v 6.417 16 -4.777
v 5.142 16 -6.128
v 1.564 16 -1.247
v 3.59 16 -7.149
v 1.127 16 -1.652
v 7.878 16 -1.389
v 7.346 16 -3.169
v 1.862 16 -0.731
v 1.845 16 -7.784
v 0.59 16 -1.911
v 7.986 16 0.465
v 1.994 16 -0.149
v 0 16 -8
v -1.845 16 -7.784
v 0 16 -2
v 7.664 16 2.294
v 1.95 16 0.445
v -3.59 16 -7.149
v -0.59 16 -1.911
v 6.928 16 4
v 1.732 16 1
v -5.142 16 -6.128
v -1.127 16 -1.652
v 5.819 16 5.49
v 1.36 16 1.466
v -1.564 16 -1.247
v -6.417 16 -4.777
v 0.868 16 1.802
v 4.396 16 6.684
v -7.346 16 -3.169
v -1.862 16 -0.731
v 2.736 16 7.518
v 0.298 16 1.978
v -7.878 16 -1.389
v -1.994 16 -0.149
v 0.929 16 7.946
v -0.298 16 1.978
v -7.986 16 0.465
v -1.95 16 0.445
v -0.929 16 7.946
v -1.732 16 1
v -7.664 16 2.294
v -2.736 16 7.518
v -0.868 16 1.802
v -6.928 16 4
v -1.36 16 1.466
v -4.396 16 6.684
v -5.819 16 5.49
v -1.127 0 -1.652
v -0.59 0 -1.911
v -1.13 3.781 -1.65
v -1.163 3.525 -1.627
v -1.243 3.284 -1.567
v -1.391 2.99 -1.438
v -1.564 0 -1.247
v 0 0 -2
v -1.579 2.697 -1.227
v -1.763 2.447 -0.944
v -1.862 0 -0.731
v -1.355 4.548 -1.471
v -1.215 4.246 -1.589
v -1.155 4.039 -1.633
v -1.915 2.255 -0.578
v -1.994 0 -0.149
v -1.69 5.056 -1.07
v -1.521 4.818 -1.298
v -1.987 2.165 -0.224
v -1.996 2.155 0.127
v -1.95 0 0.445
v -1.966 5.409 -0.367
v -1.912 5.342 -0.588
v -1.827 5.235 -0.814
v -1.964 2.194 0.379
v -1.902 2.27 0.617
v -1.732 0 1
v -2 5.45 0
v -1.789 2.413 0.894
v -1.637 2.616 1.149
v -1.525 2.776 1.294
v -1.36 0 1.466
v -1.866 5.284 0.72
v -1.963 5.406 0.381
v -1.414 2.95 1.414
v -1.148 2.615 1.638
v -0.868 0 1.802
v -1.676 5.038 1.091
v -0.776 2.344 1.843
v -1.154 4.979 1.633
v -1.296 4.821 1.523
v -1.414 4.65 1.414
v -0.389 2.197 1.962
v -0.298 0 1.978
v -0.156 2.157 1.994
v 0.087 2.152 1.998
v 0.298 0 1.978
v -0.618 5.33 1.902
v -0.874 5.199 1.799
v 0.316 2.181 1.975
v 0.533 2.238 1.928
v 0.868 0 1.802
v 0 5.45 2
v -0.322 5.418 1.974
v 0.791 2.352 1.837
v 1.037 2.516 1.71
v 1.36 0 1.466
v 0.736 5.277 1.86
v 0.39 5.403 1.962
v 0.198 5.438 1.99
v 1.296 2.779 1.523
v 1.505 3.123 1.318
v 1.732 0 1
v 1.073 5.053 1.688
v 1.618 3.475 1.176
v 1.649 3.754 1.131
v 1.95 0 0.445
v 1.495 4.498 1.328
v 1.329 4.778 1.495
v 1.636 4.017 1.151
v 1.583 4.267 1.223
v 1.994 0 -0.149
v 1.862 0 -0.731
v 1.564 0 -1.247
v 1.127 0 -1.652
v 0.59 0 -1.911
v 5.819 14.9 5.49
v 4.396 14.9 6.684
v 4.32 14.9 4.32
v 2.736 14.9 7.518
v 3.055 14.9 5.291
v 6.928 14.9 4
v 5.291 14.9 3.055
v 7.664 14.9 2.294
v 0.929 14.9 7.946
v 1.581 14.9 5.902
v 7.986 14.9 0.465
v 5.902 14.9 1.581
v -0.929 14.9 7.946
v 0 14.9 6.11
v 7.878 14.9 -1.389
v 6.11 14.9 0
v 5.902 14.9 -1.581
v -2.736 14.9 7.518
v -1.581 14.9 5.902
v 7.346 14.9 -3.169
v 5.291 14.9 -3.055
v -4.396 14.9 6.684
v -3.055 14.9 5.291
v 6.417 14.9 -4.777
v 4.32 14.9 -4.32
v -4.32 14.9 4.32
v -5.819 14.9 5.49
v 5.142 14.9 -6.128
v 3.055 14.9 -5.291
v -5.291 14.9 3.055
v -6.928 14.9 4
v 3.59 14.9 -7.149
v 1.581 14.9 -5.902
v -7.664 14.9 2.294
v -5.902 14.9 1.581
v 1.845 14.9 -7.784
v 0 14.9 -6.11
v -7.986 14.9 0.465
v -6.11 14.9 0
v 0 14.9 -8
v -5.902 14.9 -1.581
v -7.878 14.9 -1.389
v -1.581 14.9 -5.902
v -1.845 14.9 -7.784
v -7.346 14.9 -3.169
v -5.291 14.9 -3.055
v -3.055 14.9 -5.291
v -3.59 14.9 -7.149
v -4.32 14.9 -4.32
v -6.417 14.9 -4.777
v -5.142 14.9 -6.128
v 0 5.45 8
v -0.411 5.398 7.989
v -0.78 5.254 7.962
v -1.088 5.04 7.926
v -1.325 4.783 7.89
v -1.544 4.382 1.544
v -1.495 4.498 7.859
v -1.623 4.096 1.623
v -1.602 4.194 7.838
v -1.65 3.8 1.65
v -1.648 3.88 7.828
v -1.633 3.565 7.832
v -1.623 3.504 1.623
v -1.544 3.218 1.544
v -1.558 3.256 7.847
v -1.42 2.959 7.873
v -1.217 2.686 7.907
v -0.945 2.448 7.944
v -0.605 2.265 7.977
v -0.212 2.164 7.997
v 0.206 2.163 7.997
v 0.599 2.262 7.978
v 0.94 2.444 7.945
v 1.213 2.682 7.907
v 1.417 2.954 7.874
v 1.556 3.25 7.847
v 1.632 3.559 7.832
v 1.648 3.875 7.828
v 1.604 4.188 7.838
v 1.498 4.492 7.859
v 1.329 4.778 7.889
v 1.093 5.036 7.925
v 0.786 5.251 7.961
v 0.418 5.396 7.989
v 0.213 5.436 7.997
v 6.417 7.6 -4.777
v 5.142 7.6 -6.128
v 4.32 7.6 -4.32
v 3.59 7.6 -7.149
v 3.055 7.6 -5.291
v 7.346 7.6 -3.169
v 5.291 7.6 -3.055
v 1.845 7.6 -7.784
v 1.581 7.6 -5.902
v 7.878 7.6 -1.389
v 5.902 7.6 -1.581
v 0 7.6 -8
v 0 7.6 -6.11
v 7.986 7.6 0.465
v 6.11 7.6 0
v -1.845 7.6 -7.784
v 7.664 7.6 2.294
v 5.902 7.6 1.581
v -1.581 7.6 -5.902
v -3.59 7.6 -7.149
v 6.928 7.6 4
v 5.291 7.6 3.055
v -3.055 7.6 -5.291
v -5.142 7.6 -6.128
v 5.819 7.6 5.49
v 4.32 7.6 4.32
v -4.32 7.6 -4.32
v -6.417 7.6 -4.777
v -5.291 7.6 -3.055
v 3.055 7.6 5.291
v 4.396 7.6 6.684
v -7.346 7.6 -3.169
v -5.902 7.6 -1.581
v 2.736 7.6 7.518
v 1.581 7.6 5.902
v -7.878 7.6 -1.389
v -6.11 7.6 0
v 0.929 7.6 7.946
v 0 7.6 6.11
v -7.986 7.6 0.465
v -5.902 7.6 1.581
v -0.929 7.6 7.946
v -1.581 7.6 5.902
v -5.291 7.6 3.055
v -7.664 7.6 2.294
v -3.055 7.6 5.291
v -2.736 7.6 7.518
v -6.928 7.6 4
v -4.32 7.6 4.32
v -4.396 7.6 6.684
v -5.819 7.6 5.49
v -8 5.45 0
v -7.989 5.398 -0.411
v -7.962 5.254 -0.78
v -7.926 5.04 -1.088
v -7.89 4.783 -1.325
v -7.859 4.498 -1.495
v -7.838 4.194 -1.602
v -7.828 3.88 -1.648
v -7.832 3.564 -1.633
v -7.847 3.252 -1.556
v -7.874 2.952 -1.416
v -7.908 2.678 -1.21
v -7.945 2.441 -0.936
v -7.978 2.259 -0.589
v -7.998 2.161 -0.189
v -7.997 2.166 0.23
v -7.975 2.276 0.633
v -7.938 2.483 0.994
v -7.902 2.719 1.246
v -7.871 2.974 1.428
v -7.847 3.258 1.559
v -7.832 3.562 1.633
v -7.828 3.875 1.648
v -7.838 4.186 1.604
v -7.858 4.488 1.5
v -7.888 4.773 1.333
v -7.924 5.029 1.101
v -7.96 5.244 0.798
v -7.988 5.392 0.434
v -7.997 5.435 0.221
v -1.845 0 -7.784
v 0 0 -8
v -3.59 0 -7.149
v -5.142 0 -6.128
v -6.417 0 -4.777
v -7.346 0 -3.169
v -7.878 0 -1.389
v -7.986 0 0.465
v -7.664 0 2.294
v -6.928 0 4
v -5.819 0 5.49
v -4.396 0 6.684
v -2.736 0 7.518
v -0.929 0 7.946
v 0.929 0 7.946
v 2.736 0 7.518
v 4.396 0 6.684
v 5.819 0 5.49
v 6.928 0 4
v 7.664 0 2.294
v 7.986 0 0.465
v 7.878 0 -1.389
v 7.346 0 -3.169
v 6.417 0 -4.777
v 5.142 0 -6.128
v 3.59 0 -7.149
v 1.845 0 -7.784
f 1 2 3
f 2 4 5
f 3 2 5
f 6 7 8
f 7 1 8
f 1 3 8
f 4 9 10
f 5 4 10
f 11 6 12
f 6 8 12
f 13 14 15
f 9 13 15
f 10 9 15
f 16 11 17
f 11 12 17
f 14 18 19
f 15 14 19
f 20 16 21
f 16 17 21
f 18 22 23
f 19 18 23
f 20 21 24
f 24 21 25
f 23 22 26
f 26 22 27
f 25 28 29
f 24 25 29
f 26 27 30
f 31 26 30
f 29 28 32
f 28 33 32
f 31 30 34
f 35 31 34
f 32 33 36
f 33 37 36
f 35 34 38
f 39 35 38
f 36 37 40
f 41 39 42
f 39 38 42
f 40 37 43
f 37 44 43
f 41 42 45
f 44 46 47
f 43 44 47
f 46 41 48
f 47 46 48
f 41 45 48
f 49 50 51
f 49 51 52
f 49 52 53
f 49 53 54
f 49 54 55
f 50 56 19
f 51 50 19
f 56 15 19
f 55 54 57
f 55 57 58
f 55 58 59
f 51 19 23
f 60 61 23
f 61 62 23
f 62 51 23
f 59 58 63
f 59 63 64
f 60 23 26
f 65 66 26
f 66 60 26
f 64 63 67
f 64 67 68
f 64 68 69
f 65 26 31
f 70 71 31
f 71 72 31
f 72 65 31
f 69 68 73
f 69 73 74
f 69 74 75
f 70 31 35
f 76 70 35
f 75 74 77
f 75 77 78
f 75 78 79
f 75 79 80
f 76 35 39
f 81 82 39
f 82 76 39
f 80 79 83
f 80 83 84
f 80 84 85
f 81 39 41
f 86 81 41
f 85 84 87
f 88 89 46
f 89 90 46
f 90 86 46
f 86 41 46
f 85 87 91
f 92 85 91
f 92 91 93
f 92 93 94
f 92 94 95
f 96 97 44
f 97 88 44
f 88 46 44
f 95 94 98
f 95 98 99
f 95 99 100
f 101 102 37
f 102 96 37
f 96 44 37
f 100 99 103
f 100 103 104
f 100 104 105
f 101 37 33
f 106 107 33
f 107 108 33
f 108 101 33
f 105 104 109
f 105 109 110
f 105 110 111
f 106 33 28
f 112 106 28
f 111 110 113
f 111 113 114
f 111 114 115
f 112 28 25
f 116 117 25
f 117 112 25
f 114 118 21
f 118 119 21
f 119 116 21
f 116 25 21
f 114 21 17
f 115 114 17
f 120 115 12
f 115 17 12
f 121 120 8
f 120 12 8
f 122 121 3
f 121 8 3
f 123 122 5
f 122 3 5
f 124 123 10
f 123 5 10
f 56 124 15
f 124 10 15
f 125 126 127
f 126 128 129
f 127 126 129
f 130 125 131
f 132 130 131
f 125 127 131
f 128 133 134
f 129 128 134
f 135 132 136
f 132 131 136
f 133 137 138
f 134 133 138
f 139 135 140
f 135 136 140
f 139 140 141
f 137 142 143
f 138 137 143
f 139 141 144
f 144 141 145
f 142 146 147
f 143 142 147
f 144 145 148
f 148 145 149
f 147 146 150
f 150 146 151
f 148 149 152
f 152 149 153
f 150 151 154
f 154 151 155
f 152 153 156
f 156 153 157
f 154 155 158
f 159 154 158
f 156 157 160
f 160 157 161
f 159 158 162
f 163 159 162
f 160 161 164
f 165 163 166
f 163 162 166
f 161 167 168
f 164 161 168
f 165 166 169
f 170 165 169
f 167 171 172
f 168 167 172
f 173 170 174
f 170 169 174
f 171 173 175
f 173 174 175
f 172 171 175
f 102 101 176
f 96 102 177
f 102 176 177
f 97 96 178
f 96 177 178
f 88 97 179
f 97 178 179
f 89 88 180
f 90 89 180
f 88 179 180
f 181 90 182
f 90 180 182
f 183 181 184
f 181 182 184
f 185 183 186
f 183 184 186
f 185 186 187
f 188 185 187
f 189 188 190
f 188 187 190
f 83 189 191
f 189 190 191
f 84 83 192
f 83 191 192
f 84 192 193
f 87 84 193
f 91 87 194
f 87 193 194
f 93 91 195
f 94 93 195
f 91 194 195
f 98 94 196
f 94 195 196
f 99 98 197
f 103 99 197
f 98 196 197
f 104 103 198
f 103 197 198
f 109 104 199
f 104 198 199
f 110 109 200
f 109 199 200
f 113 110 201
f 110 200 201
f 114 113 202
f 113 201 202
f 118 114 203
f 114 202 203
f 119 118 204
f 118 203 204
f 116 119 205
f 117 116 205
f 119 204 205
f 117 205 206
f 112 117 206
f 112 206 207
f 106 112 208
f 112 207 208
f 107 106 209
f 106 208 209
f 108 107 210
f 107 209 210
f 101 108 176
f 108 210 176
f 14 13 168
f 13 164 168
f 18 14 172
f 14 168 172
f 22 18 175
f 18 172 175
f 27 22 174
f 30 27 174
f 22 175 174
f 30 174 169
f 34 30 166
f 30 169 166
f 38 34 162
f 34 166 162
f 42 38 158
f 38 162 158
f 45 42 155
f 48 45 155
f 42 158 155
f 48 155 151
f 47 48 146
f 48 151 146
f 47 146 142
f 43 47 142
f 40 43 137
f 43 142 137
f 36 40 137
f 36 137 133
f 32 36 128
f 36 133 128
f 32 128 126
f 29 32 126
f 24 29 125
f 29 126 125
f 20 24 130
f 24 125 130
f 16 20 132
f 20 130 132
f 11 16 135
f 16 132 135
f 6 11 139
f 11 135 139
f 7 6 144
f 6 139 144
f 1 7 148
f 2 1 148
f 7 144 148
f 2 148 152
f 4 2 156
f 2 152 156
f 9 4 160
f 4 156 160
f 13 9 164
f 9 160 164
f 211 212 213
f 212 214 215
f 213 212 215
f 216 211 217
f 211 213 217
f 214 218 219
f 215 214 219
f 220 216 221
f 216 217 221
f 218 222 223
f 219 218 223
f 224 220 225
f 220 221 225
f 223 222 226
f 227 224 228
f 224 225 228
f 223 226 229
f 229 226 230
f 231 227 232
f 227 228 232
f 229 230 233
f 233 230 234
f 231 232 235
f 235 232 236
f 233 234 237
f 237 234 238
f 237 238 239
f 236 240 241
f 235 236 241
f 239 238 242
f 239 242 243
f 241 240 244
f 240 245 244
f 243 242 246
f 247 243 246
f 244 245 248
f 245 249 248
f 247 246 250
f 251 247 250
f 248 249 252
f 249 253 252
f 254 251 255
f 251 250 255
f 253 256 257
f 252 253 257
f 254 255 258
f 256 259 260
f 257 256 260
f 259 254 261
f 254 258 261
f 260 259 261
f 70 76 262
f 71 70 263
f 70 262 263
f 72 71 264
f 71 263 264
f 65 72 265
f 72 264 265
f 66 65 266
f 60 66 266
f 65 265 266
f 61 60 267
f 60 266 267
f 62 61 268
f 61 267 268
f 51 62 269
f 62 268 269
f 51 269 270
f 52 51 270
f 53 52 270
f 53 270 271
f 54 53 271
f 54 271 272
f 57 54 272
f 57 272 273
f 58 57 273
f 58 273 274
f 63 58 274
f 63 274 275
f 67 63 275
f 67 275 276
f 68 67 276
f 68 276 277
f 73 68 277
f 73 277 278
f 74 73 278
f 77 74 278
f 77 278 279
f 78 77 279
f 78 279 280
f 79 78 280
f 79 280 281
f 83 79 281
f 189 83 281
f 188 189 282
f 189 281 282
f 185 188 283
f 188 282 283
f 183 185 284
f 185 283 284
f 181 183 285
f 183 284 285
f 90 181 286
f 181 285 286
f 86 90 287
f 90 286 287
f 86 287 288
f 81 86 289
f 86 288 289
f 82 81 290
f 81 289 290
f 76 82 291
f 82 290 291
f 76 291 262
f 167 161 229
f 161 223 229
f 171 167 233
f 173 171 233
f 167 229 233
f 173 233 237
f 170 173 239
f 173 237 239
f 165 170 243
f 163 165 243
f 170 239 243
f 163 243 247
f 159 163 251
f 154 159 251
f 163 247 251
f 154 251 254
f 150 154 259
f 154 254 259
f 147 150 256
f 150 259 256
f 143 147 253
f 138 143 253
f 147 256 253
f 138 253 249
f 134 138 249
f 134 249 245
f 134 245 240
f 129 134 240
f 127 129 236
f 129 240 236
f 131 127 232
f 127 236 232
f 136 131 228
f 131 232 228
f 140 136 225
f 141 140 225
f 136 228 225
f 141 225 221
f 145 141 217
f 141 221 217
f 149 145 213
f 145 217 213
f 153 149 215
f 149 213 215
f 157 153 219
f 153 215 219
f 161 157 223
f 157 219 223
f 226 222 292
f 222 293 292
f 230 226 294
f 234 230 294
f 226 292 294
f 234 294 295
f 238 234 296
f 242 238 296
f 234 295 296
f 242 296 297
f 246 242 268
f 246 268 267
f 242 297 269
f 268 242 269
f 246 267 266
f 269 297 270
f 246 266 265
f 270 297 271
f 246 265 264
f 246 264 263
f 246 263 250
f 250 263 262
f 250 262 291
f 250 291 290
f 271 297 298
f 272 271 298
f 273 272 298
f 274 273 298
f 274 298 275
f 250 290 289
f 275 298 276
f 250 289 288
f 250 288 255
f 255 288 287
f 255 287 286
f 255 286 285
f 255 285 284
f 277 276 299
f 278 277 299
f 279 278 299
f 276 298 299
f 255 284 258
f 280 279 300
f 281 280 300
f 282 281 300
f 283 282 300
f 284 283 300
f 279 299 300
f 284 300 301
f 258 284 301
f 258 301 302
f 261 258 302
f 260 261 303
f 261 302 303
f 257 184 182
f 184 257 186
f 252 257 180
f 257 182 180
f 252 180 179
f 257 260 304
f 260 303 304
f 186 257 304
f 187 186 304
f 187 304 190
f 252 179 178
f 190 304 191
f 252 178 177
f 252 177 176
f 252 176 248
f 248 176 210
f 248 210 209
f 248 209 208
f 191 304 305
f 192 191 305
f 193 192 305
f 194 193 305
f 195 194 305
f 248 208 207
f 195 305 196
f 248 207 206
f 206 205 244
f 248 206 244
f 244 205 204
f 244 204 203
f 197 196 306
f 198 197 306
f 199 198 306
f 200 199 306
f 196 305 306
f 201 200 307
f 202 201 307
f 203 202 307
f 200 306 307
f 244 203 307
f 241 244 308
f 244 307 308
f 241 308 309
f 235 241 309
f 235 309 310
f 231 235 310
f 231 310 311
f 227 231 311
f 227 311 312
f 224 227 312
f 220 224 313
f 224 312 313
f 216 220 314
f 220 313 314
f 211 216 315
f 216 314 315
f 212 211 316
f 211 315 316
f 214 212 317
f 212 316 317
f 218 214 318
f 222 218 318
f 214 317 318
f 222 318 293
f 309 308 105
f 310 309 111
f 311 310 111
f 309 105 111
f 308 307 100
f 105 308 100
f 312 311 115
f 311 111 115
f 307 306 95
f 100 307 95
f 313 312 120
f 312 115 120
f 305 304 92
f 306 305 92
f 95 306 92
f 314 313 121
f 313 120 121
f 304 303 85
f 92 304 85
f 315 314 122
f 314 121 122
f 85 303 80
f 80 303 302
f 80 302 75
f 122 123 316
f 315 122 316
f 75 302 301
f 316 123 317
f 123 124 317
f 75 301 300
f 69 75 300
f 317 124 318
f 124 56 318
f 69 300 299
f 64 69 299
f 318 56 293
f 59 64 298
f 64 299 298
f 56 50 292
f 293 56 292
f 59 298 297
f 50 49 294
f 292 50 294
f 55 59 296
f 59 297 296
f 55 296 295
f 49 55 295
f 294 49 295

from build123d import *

# Parameters (mm, degrees)
ESQUISSE4_W                  = 1.65
ESQUISSE4_H                  = 8
R_P_TITION_CIRCULAIRE1_COUNT = 2
R_P_TITION_CIRCULAIRE1_ANGLE = 90


with BuildPart() as part:
    # Esquisse2 → Révolution1 (revolve)
    with BuildSketch(Plane.XY):
        Polygon((2, 16), (8, 16), (8, 14.9), (6.11, 14.9), (6.11, 7.6), (8, 7.6), (8, 0), (2, 0), align=None)
    revolve(axis=Axis((0, 0, 0), (0, 1, 0)))

    # Esquisse4 → Trou pour taraudage pour trou taraudé M41 (revolve, cut)
    with BuildSketch(Plane(origin=(0, 3.8, 0), x_dir=(0, 1, 0), z_dir=(1, 0, 0))):
        with Locations((0.825, 4)):
            Rectangle(ESQUISSE4_W, ESQUISSE4_H)
    trou_pour_taraudage_pour_trou_taraud_m4 = revolve(axis=Axis((0, 3.8, -6.35), (0, 0, 1)), mode=Mode.SUBTRACT)

    # Répétition circulaire1: Trou pour taraudage pour trou taraudé M41 ×2 about axis
    r_p_tition_circulaire1_axis = Axis((0, 16, 0), (0, -1, 0))
    for i in range(1, R_P_TITION_CIRCULAIRE1_COUNT):
        add(trou_pour_taraudage_pour_trou_taraud_m4.rotate(r_p_tition_circulaire1_axis, i * R_P_TITION_CIRCULAIRE1_ANGLE / (R_P_TITION_CIRCULAIRE1_COUNT - 1)), mode=Mode.SUBTRACT)


solid = part.part
